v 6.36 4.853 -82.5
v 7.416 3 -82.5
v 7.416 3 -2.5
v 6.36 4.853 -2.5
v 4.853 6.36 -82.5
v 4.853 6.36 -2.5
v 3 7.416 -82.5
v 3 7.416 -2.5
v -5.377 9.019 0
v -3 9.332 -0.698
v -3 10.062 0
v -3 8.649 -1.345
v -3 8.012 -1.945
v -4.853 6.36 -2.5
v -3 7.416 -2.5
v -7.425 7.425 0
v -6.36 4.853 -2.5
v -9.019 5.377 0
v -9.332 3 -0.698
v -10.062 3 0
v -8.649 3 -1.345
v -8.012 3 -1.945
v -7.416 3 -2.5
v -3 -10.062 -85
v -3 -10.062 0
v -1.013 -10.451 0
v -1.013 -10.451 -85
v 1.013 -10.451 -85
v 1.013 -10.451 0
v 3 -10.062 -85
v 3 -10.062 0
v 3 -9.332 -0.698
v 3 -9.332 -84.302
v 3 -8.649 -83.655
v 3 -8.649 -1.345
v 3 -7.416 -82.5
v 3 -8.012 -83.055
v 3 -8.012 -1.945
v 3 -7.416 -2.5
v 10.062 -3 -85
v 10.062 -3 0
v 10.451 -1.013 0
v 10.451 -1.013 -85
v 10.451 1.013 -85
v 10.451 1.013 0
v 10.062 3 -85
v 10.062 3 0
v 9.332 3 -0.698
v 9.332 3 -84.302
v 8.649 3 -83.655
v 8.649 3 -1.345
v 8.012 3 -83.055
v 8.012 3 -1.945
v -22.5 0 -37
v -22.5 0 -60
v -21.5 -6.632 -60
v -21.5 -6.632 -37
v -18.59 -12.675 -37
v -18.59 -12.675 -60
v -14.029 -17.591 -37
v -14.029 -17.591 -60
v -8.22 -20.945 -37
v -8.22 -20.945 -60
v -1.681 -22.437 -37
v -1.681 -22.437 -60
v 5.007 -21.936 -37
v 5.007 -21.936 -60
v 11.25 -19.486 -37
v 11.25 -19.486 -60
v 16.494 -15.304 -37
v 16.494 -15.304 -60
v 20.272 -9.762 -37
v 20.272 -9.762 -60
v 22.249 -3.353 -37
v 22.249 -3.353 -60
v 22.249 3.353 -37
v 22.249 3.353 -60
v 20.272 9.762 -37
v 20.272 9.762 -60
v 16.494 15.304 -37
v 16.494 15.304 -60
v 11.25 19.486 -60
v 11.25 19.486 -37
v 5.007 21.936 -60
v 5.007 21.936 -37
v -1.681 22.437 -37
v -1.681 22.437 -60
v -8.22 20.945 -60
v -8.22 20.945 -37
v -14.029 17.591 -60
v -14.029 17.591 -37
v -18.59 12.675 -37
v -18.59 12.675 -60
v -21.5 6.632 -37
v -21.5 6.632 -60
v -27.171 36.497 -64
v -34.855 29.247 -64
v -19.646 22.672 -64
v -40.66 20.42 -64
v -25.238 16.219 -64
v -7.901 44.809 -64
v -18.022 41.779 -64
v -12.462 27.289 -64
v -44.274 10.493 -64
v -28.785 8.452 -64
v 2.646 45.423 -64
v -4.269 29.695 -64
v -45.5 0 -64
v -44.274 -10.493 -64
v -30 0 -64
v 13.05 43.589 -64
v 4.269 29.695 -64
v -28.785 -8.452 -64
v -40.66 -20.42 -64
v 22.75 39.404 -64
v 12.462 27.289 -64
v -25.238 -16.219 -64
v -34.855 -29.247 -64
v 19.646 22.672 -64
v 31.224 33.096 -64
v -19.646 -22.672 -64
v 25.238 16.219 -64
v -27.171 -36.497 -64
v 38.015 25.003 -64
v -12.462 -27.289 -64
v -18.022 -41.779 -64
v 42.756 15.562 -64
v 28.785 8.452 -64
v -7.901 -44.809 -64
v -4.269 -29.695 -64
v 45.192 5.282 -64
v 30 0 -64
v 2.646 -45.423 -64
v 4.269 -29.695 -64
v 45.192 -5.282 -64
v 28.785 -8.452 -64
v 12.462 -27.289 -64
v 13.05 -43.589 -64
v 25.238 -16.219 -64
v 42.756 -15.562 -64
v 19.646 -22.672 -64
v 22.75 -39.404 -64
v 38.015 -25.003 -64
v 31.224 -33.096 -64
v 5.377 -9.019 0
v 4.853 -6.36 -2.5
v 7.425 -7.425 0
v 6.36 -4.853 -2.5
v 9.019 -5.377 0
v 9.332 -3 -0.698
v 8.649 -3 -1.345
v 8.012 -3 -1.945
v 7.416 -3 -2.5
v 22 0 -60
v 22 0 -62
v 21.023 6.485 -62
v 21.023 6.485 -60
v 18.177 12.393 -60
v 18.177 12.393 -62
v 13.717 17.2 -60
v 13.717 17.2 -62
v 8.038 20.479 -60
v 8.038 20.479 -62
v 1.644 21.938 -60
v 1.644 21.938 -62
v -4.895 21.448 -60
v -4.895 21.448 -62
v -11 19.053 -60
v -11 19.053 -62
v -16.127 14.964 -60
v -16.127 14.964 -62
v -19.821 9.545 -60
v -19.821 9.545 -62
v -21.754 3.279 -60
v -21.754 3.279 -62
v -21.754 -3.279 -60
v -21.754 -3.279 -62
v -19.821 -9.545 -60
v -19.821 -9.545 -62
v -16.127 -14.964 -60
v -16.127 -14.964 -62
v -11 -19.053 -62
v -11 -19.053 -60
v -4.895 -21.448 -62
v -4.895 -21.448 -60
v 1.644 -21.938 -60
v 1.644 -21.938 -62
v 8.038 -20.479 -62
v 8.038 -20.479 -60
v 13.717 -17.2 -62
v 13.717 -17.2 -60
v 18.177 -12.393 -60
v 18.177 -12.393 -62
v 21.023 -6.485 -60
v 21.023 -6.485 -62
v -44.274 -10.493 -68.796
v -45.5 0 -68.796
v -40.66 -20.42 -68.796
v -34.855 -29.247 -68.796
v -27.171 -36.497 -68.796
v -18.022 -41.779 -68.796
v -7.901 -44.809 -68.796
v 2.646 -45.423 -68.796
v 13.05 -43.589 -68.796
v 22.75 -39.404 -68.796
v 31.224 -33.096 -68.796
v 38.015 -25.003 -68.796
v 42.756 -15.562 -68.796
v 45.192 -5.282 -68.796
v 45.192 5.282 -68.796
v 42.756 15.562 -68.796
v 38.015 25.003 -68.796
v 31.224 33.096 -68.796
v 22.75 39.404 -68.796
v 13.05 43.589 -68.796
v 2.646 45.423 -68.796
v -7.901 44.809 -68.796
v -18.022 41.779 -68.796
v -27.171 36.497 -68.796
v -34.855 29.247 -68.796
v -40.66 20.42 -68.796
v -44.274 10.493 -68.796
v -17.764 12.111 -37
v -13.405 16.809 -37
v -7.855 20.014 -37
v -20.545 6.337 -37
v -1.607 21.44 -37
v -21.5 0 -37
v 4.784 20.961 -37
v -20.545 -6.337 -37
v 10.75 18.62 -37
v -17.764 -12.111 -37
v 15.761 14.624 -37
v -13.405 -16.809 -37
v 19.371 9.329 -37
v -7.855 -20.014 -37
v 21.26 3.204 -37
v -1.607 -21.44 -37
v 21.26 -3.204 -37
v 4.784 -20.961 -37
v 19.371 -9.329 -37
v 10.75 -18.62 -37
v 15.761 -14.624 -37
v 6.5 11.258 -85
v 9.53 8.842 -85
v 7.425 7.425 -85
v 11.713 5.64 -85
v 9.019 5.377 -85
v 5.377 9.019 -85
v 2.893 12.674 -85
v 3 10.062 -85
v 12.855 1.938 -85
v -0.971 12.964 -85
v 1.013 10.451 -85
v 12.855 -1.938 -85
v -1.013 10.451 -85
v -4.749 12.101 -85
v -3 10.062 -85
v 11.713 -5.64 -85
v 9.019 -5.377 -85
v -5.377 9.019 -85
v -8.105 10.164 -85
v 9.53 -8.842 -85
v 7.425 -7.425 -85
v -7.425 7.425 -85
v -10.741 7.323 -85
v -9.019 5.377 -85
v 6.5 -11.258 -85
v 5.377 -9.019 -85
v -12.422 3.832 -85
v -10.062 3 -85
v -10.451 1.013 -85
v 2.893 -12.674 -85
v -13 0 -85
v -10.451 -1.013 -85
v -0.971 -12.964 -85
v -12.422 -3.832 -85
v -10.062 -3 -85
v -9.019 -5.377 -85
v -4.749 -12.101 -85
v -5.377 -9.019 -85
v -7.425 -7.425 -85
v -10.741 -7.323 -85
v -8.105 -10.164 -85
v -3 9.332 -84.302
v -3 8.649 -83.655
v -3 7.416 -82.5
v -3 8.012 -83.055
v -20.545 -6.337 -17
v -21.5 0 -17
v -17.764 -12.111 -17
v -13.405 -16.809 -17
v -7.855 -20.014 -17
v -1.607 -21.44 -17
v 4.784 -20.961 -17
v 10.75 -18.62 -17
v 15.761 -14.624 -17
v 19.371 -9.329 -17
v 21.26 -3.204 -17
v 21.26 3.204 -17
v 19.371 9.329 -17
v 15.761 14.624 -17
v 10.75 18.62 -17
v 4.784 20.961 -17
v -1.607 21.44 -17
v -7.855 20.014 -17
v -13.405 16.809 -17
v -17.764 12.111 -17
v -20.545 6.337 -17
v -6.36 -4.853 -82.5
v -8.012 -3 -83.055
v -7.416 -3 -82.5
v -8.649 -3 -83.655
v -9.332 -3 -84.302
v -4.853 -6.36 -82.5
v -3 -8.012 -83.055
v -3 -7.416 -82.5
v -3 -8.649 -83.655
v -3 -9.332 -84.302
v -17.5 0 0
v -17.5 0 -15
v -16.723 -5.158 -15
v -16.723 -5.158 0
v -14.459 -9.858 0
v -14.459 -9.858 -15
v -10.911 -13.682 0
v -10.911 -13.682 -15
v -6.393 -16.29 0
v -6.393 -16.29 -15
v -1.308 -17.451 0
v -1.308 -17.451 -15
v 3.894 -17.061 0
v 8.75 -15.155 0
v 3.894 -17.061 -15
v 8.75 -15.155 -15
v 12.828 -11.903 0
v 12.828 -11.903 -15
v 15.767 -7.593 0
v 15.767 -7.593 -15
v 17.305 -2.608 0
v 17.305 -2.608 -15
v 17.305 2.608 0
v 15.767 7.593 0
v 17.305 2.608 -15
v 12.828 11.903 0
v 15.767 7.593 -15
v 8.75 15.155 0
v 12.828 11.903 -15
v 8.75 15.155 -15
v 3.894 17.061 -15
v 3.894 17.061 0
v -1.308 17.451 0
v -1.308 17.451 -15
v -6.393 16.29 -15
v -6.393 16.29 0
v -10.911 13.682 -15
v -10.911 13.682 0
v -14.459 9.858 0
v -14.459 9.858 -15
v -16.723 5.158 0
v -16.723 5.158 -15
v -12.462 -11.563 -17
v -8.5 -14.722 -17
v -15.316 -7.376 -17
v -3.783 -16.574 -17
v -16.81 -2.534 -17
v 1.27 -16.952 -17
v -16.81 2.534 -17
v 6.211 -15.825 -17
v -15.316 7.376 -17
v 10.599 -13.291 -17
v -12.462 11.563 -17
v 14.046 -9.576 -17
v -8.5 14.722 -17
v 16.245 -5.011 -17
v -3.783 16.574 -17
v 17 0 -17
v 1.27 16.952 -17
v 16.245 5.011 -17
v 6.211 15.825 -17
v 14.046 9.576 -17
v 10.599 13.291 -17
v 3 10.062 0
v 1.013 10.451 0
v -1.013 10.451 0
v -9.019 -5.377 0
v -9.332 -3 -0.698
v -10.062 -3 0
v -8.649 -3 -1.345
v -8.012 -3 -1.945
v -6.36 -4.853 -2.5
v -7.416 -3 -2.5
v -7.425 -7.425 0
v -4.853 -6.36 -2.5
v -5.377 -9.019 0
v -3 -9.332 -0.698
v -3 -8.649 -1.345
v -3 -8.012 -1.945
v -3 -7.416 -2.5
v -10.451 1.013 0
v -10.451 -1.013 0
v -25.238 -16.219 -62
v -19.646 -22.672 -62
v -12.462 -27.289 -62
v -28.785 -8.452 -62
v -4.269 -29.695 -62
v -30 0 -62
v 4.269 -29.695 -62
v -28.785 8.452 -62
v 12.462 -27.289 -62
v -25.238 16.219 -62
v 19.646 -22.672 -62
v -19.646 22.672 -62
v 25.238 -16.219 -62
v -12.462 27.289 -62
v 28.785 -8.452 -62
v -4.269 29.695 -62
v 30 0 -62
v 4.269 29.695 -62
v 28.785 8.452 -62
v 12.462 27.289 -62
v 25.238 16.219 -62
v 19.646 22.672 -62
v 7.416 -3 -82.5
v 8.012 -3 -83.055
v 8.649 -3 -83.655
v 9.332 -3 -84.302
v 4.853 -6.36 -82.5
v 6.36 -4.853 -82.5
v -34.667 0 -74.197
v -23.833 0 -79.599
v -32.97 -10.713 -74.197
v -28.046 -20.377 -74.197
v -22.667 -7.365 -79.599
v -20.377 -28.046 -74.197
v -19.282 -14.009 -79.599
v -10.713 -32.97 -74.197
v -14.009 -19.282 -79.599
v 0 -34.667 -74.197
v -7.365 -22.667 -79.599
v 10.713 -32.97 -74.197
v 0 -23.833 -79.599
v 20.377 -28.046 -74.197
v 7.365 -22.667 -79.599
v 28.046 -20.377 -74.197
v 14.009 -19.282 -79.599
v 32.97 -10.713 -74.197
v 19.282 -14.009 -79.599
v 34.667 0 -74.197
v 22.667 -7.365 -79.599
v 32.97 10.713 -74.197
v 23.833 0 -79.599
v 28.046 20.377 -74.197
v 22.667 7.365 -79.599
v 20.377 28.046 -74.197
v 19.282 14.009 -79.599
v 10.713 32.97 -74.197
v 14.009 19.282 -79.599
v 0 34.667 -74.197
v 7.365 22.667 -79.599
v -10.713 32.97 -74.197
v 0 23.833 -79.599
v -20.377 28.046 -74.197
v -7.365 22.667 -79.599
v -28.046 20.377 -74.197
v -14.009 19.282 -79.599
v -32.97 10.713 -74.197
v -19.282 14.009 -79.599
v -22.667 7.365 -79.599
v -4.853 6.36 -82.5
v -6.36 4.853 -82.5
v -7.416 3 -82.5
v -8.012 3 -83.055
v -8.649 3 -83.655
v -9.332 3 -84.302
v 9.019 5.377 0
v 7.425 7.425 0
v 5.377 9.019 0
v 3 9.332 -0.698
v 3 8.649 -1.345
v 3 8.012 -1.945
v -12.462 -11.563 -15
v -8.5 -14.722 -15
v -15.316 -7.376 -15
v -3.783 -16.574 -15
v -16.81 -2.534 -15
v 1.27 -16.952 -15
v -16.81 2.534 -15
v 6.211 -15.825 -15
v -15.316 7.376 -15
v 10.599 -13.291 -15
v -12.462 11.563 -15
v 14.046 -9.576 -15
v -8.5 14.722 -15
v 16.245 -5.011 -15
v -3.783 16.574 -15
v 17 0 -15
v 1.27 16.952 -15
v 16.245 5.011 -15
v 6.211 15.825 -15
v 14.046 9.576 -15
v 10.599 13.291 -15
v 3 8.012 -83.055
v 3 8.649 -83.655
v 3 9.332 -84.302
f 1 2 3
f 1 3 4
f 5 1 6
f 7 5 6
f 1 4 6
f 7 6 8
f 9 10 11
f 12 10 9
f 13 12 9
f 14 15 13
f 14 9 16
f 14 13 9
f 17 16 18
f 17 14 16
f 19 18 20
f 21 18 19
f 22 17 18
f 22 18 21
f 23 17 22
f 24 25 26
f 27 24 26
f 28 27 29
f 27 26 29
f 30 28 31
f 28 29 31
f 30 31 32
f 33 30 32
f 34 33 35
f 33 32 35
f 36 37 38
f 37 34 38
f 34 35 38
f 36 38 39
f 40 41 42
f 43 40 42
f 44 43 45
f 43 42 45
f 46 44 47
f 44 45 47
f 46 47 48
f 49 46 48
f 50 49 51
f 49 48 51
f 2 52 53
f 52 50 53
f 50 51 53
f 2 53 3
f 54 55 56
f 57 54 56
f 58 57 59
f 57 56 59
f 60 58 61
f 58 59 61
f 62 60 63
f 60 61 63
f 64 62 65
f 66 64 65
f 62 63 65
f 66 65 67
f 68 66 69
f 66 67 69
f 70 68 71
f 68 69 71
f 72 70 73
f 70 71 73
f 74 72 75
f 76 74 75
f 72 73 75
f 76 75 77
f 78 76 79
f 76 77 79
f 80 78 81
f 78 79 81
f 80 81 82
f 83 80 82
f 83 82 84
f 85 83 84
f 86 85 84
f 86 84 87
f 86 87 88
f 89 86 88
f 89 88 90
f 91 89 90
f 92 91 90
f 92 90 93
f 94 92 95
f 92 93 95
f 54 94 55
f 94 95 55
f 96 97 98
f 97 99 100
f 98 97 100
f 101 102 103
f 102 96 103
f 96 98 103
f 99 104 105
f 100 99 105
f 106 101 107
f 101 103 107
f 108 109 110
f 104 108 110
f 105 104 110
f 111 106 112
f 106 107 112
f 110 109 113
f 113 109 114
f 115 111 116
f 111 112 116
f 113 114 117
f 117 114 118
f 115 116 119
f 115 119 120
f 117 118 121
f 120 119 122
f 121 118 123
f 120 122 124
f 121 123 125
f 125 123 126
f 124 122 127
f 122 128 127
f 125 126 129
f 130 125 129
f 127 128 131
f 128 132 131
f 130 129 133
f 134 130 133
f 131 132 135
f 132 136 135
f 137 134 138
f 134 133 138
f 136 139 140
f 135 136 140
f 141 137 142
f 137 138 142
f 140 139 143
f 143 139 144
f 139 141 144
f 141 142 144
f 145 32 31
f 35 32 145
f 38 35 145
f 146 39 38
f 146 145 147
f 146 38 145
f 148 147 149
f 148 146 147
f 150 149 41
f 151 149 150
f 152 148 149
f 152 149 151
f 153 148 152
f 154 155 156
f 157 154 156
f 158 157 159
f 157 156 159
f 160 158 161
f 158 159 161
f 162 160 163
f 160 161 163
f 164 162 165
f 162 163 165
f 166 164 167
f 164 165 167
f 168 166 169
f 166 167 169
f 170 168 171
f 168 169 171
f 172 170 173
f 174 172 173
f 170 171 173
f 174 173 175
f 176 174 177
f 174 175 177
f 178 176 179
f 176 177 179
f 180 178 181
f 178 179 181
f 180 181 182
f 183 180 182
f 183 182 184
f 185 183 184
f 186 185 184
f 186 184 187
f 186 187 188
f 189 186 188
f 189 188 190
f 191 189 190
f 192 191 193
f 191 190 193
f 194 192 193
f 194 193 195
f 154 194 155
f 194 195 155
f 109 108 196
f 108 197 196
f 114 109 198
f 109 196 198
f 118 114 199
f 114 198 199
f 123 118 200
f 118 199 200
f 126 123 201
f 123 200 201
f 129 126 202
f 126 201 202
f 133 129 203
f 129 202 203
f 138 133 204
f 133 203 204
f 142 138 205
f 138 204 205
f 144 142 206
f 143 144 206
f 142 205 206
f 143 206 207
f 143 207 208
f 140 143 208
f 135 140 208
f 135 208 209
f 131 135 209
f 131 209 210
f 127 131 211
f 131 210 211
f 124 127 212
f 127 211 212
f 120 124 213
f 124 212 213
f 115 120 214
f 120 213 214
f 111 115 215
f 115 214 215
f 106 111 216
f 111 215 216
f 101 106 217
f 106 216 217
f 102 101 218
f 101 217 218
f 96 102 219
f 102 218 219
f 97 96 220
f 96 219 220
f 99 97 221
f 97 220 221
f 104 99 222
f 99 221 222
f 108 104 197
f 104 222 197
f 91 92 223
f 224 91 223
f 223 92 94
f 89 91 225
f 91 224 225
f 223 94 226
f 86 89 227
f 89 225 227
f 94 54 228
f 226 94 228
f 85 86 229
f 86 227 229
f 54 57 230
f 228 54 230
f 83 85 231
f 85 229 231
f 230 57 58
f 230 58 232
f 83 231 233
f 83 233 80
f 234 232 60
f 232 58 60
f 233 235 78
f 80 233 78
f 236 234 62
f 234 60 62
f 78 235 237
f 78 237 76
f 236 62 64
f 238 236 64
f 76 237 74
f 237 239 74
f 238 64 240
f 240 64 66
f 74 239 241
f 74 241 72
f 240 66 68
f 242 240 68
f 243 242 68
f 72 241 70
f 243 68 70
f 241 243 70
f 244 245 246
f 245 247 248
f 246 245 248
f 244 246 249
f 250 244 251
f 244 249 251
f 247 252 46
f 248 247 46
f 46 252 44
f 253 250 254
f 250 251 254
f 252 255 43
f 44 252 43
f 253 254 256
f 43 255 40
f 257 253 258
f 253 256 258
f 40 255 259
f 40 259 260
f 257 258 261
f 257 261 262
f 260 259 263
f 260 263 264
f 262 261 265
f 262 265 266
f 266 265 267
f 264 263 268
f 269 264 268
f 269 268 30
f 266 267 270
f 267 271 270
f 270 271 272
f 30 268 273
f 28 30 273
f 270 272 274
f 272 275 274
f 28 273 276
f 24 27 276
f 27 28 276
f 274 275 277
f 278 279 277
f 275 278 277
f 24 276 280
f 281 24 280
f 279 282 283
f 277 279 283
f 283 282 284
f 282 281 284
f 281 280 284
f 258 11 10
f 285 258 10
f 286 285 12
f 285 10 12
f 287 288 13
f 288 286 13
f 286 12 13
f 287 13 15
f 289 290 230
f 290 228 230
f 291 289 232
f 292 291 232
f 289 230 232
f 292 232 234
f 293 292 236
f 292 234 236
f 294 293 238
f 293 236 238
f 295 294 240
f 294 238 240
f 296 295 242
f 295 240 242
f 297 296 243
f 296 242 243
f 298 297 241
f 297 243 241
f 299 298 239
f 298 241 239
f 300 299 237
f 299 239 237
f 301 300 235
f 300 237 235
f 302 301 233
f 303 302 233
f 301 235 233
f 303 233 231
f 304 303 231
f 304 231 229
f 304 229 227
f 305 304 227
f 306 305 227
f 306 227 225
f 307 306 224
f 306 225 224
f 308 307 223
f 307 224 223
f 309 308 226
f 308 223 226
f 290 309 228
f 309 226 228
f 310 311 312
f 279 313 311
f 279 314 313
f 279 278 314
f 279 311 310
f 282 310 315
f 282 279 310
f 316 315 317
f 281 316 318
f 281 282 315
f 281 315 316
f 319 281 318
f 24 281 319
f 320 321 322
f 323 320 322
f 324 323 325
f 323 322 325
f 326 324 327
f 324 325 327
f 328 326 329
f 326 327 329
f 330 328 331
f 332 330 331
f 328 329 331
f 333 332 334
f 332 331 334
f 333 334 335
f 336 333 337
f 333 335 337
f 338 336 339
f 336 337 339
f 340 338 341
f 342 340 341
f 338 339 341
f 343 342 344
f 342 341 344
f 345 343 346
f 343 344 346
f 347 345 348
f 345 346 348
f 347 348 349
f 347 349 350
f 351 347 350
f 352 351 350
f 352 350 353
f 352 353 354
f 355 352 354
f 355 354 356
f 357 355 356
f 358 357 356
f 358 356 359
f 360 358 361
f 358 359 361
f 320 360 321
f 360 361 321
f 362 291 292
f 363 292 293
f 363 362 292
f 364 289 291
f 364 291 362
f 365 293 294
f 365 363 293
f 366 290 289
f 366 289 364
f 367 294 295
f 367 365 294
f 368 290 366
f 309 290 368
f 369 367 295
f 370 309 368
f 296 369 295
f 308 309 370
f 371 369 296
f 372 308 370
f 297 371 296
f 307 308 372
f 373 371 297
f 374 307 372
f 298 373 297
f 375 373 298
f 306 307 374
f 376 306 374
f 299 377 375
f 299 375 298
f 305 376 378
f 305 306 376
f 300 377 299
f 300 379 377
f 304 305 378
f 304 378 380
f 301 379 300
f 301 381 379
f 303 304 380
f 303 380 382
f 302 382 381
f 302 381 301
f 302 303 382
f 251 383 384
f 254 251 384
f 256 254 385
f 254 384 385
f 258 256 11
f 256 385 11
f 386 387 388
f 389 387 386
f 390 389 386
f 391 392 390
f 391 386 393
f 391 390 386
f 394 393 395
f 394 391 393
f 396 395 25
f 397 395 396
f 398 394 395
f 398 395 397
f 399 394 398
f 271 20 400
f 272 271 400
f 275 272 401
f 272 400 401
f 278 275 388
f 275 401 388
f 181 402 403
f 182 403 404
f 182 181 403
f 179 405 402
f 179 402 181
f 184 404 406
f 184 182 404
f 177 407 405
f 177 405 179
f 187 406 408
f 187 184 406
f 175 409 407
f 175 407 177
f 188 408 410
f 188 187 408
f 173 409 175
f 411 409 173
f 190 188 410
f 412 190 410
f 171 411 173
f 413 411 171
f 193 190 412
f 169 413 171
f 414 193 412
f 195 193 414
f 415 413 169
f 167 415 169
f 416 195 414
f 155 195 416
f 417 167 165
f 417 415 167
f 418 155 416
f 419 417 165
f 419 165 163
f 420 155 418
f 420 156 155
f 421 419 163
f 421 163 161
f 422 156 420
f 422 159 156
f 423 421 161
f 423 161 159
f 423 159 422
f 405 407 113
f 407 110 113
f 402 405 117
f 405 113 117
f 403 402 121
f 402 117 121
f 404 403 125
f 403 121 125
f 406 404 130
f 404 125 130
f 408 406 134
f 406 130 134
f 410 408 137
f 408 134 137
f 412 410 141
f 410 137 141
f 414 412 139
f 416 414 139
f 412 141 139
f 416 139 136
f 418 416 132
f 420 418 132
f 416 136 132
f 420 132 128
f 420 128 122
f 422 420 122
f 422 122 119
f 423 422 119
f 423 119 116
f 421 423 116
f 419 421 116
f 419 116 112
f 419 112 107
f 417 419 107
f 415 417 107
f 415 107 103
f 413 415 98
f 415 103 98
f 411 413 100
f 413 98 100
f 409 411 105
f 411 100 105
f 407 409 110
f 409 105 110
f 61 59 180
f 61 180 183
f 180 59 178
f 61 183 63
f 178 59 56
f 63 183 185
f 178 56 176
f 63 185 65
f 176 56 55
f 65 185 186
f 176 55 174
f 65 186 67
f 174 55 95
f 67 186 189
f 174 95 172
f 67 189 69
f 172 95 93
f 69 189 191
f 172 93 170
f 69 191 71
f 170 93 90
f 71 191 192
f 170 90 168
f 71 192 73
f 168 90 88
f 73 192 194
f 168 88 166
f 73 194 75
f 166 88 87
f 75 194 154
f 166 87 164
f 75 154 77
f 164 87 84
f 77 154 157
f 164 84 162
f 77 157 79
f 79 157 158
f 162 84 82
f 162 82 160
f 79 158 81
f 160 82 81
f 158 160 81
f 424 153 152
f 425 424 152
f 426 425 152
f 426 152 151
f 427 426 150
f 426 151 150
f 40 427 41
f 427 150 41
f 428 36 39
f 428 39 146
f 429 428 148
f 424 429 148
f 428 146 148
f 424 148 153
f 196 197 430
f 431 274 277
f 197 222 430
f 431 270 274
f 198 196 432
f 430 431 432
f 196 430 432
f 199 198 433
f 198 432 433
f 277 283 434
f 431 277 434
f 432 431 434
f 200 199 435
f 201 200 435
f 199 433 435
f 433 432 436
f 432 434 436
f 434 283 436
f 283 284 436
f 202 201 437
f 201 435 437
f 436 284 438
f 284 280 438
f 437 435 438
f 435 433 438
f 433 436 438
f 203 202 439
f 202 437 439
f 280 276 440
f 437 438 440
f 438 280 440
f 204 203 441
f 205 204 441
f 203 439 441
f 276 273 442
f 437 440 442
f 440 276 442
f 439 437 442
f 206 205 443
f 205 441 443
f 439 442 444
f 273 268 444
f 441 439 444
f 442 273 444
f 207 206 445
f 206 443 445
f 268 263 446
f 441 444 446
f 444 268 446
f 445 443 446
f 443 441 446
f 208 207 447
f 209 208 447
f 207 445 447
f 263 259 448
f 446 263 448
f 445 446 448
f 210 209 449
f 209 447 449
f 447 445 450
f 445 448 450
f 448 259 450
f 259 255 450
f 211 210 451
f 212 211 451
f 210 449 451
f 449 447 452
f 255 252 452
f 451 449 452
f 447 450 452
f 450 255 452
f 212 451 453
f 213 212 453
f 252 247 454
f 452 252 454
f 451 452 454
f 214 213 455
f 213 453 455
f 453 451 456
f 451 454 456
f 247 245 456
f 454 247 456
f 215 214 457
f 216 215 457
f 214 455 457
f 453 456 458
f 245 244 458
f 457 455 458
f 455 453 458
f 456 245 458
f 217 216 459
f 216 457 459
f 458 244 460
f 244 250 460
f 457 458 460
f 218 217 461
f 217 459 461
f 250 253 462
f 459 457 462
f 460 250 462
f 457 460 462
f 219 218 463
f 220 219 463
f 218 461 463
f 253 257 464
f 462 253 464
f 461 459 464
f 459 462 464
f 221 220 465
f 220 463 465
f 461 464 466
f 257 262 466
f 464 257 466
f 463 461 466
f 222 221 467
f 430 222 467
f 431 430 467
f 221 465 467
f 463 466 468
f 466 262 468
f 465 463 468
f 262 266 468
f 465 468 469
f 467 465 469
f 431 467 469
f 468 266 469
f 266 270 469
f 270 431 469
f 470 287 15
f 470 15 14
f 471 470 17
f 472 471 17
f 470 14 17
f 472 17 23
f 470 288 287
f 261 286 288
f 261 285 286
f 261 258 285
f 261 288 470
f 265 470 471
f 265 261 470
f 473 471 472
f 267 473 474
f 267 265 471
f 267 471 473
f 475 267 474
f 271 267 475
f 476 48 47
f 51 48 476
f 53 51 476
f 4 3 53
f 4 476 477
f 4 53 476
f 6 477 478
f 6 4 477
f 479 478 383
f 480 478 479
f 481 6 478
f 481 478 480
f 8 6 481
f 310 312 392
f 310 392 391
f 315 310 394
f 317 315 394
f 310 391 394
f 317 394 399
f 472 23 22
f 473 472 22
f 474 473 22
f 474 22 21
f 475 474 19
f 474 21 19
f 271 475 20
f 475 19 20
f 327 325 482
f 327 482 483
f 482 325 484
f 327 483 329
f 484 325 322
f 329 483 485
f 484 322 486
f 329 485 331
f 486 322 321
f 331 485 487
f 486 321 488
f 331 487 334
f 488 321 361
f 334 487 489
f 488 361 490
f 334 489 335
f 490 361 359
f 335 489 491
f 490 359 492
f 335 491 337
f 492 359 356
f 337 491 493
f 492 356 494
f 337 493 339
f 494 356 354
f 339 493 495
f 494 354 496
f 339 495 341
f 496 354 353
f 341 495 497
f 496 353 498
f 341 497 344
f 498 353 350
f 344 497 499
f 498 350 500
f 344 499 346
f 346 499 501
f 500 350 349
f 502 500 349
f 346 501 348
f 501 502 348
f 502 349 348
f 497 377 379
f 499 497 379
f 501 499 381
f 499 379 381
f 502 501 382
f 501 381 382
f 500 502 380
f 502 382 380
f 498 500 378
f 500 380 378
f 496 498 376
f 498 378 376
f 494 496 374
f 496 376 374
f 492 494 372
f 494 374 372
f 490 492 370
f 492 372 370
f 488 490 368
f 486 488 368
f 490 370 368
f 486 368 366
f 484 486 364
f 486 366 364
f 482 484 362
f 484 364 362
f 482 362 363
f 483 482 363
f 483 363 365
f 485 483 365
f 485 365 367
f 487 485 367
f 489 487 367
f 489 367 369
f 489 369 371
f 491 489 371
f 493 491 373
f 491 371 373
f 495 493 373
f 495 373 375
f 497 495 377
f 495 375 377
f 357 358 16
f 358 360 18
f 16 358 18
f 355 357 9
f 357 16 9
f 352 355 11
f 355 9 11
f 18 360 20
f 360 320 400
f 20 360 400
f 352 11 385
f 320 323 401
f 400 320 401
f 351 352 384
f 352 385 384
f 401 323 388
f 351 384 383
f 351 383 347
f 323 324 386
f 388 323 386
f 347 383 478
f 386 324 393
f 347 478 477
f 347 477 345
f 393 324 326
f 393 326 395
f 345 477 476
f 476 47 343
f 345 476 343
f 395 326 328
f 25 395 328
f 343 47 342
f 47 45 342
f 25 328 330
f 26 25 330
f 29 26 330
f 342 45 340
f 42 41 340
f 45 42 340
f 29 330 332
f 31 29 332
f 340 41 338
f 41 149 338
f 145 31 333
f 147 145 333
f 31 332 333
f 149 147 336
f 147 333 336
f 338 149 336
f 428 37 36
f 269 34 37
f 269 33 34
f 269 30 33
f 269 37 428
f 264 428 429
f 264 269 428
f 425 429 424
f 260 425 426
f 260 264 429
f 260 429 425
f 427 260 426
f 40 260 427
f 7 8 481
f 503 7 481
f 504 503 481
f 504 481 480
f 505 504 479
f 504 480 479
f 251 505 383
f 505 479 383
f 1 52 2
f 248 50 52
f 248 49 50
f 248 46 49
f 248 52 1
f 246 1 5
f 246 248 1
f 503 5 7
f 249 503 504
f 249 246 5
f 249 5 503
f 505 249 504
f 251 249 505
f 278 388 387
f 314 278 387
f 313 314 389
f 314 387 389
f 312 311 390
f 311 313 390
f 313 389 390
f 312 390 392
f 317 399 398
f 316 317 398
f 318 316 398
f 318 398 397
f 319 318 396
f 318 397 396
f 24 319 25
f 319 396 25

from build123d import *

# Parameters (mm, degrees)
SKETCH_2_OUTSIDE_W  = 123.846
SKETCH_2_OUTSIDE_H  = 123.846
SKETCH_2_OUTSIDE_R  = 17
CUT_EXTRUDE_1_DEPTH = 2
SKETCH_3_OUTSIDE_W  = 123.846
SKETCH_3_OUTSIDE_H  = 123.846
SKETCH_3_OUTSIDE_R  = 22
CUT_EXTRUDE_2_DEPTH = 2
CUT_EXTRUDE_3_DEPTH = 107.609099049
CHAMFER_1_SIZE      = 2.5


with BuildPart() as part:
    # 草图1 → 旋转1 (revolve)
    with BuildSketch(Plane(origin=(0, 0, 0), x_dir=(0, 0, -1), z_dir=(1, 0, 0)), mode=Mode.PRIVATE) as revolve_1_sk:
        Polygon((0, 0), (0, 17.5), (17, 17.5), (17, 21.5), (37, 21.5), (37, 22.5), (62, 22.5), (62, 30), (64, 30), (64, 45.5), (68.796097738, 45.5), (85, 13), (85, 0), align=None)
    revolve(revolve_1_sk.sketch.rotate(Axis((0, 0, -85), (0, 0, 1)), 90), axis=Axis((0, 0, -85), (0, 0, 1)))

    # 草图2 outside → 切除-拉伸1 (cut)
    with BuildSketch(Plane.XY.offset(-17)):
        Rectangle(SKETCH_2_OUTSIDE_W, SKETCH_2_OUTSIDE_H)
        Circle(SKETCH_2_OUTSIDE_R, mode=Mode.SUBTRACT)
    extrude(amount=CUT_EXTRUDE_1_DEPTH, mode=Mode.SUBTRACT)

    # 草图3 outside → 切除-拉伸2 (cut)
    with BuildSketch(Plane.XY.offset(-62)):
        Rectangle(SKETCH_3_OUTSIDE_W, SKETCH_3_OUTSIDE_H)
        Circle(SKETCH_3_OUTSIDE_R, mode=Mode.SUBTRACT)
    extrude(amount=CUT_EXTRUDE_2_DEPTH, mode=Mode.SUBTRACT)

    # 草图4 → 切除-拉伸3 (cut, through all)
    with BuildSketch(Plane.XY):
        with BuildLine():
            Line((-3, 10.062305899), (-3, 7.416198487))
            ThreePointArc((-3, 7.416198487), (-5.656854249, 5.656854249), (-7.416198487, 3))
            Line((-7.416198487, 3), (-10.062305899, 3))
            ThreePointArc((-10.062305899, 3), (-10.5, 0), (-10.062305899, -3))
            Line((-10.062305899, -3), (-7.416198487, -3))
            ThreePointArc((-7.416198487, -3), (-5.656854249, -5.656854249), (-3, -7.416198487))
            Line((-3, -7.416198487), (-3, -10.062305899))
            ThreePointArc((-3, -10.062305899), (0, -10.5), (3, -10.062305899))
            Line((3, -10.062305899), (3, -7.416198487))
            ThreePointArc((3, -7.416198487), (5.656854249, -5.656854249), (7.416198487, -3))
            Line((7.416198487, -3), (10.062305899, -3))
            ThreePointArc((10.062305899, -3), (10.5, 0), (10.062305899, 3))
            Line((10.062305899, 3), (7.416198487, 3))
            ThreePointArc((7.416198487, 3), (5.656854249, 5.656854249), (3, 7.416198487))
            Line((3, 7.416198487), (3, 10.062305899))
            ThreePointArc((3, 10.062305899), (0, 10.5), (-3, 10.062305899))
        make_face()
    extrude(amount=-CUT_EXTRUDE_3_DEPTH, mode=Mode.SUBTRACT)

    # 倒角1
    chamfer_1_edges = [part.edges().sort_by_distance(p)[0] for p in [
        (5.656854249, -5.656854249, -85),
        (5.656854249, 5.656854249, -85),
        (-5.656854249, 5.656854249, -85),
        (-5.656854249, -5.656854249, -85),
        (-5.656854249, -5.656854249, 0),
        (5.656854249, -5.656854249, 0),
        (5.656854249, 5.656854249, 0),
        (-5.656854249, 5.656854249, 0),
    ]]
    chamfer(chamfer_1_edges, length=CHAMFER_1_SIZE)


solid = part.part
